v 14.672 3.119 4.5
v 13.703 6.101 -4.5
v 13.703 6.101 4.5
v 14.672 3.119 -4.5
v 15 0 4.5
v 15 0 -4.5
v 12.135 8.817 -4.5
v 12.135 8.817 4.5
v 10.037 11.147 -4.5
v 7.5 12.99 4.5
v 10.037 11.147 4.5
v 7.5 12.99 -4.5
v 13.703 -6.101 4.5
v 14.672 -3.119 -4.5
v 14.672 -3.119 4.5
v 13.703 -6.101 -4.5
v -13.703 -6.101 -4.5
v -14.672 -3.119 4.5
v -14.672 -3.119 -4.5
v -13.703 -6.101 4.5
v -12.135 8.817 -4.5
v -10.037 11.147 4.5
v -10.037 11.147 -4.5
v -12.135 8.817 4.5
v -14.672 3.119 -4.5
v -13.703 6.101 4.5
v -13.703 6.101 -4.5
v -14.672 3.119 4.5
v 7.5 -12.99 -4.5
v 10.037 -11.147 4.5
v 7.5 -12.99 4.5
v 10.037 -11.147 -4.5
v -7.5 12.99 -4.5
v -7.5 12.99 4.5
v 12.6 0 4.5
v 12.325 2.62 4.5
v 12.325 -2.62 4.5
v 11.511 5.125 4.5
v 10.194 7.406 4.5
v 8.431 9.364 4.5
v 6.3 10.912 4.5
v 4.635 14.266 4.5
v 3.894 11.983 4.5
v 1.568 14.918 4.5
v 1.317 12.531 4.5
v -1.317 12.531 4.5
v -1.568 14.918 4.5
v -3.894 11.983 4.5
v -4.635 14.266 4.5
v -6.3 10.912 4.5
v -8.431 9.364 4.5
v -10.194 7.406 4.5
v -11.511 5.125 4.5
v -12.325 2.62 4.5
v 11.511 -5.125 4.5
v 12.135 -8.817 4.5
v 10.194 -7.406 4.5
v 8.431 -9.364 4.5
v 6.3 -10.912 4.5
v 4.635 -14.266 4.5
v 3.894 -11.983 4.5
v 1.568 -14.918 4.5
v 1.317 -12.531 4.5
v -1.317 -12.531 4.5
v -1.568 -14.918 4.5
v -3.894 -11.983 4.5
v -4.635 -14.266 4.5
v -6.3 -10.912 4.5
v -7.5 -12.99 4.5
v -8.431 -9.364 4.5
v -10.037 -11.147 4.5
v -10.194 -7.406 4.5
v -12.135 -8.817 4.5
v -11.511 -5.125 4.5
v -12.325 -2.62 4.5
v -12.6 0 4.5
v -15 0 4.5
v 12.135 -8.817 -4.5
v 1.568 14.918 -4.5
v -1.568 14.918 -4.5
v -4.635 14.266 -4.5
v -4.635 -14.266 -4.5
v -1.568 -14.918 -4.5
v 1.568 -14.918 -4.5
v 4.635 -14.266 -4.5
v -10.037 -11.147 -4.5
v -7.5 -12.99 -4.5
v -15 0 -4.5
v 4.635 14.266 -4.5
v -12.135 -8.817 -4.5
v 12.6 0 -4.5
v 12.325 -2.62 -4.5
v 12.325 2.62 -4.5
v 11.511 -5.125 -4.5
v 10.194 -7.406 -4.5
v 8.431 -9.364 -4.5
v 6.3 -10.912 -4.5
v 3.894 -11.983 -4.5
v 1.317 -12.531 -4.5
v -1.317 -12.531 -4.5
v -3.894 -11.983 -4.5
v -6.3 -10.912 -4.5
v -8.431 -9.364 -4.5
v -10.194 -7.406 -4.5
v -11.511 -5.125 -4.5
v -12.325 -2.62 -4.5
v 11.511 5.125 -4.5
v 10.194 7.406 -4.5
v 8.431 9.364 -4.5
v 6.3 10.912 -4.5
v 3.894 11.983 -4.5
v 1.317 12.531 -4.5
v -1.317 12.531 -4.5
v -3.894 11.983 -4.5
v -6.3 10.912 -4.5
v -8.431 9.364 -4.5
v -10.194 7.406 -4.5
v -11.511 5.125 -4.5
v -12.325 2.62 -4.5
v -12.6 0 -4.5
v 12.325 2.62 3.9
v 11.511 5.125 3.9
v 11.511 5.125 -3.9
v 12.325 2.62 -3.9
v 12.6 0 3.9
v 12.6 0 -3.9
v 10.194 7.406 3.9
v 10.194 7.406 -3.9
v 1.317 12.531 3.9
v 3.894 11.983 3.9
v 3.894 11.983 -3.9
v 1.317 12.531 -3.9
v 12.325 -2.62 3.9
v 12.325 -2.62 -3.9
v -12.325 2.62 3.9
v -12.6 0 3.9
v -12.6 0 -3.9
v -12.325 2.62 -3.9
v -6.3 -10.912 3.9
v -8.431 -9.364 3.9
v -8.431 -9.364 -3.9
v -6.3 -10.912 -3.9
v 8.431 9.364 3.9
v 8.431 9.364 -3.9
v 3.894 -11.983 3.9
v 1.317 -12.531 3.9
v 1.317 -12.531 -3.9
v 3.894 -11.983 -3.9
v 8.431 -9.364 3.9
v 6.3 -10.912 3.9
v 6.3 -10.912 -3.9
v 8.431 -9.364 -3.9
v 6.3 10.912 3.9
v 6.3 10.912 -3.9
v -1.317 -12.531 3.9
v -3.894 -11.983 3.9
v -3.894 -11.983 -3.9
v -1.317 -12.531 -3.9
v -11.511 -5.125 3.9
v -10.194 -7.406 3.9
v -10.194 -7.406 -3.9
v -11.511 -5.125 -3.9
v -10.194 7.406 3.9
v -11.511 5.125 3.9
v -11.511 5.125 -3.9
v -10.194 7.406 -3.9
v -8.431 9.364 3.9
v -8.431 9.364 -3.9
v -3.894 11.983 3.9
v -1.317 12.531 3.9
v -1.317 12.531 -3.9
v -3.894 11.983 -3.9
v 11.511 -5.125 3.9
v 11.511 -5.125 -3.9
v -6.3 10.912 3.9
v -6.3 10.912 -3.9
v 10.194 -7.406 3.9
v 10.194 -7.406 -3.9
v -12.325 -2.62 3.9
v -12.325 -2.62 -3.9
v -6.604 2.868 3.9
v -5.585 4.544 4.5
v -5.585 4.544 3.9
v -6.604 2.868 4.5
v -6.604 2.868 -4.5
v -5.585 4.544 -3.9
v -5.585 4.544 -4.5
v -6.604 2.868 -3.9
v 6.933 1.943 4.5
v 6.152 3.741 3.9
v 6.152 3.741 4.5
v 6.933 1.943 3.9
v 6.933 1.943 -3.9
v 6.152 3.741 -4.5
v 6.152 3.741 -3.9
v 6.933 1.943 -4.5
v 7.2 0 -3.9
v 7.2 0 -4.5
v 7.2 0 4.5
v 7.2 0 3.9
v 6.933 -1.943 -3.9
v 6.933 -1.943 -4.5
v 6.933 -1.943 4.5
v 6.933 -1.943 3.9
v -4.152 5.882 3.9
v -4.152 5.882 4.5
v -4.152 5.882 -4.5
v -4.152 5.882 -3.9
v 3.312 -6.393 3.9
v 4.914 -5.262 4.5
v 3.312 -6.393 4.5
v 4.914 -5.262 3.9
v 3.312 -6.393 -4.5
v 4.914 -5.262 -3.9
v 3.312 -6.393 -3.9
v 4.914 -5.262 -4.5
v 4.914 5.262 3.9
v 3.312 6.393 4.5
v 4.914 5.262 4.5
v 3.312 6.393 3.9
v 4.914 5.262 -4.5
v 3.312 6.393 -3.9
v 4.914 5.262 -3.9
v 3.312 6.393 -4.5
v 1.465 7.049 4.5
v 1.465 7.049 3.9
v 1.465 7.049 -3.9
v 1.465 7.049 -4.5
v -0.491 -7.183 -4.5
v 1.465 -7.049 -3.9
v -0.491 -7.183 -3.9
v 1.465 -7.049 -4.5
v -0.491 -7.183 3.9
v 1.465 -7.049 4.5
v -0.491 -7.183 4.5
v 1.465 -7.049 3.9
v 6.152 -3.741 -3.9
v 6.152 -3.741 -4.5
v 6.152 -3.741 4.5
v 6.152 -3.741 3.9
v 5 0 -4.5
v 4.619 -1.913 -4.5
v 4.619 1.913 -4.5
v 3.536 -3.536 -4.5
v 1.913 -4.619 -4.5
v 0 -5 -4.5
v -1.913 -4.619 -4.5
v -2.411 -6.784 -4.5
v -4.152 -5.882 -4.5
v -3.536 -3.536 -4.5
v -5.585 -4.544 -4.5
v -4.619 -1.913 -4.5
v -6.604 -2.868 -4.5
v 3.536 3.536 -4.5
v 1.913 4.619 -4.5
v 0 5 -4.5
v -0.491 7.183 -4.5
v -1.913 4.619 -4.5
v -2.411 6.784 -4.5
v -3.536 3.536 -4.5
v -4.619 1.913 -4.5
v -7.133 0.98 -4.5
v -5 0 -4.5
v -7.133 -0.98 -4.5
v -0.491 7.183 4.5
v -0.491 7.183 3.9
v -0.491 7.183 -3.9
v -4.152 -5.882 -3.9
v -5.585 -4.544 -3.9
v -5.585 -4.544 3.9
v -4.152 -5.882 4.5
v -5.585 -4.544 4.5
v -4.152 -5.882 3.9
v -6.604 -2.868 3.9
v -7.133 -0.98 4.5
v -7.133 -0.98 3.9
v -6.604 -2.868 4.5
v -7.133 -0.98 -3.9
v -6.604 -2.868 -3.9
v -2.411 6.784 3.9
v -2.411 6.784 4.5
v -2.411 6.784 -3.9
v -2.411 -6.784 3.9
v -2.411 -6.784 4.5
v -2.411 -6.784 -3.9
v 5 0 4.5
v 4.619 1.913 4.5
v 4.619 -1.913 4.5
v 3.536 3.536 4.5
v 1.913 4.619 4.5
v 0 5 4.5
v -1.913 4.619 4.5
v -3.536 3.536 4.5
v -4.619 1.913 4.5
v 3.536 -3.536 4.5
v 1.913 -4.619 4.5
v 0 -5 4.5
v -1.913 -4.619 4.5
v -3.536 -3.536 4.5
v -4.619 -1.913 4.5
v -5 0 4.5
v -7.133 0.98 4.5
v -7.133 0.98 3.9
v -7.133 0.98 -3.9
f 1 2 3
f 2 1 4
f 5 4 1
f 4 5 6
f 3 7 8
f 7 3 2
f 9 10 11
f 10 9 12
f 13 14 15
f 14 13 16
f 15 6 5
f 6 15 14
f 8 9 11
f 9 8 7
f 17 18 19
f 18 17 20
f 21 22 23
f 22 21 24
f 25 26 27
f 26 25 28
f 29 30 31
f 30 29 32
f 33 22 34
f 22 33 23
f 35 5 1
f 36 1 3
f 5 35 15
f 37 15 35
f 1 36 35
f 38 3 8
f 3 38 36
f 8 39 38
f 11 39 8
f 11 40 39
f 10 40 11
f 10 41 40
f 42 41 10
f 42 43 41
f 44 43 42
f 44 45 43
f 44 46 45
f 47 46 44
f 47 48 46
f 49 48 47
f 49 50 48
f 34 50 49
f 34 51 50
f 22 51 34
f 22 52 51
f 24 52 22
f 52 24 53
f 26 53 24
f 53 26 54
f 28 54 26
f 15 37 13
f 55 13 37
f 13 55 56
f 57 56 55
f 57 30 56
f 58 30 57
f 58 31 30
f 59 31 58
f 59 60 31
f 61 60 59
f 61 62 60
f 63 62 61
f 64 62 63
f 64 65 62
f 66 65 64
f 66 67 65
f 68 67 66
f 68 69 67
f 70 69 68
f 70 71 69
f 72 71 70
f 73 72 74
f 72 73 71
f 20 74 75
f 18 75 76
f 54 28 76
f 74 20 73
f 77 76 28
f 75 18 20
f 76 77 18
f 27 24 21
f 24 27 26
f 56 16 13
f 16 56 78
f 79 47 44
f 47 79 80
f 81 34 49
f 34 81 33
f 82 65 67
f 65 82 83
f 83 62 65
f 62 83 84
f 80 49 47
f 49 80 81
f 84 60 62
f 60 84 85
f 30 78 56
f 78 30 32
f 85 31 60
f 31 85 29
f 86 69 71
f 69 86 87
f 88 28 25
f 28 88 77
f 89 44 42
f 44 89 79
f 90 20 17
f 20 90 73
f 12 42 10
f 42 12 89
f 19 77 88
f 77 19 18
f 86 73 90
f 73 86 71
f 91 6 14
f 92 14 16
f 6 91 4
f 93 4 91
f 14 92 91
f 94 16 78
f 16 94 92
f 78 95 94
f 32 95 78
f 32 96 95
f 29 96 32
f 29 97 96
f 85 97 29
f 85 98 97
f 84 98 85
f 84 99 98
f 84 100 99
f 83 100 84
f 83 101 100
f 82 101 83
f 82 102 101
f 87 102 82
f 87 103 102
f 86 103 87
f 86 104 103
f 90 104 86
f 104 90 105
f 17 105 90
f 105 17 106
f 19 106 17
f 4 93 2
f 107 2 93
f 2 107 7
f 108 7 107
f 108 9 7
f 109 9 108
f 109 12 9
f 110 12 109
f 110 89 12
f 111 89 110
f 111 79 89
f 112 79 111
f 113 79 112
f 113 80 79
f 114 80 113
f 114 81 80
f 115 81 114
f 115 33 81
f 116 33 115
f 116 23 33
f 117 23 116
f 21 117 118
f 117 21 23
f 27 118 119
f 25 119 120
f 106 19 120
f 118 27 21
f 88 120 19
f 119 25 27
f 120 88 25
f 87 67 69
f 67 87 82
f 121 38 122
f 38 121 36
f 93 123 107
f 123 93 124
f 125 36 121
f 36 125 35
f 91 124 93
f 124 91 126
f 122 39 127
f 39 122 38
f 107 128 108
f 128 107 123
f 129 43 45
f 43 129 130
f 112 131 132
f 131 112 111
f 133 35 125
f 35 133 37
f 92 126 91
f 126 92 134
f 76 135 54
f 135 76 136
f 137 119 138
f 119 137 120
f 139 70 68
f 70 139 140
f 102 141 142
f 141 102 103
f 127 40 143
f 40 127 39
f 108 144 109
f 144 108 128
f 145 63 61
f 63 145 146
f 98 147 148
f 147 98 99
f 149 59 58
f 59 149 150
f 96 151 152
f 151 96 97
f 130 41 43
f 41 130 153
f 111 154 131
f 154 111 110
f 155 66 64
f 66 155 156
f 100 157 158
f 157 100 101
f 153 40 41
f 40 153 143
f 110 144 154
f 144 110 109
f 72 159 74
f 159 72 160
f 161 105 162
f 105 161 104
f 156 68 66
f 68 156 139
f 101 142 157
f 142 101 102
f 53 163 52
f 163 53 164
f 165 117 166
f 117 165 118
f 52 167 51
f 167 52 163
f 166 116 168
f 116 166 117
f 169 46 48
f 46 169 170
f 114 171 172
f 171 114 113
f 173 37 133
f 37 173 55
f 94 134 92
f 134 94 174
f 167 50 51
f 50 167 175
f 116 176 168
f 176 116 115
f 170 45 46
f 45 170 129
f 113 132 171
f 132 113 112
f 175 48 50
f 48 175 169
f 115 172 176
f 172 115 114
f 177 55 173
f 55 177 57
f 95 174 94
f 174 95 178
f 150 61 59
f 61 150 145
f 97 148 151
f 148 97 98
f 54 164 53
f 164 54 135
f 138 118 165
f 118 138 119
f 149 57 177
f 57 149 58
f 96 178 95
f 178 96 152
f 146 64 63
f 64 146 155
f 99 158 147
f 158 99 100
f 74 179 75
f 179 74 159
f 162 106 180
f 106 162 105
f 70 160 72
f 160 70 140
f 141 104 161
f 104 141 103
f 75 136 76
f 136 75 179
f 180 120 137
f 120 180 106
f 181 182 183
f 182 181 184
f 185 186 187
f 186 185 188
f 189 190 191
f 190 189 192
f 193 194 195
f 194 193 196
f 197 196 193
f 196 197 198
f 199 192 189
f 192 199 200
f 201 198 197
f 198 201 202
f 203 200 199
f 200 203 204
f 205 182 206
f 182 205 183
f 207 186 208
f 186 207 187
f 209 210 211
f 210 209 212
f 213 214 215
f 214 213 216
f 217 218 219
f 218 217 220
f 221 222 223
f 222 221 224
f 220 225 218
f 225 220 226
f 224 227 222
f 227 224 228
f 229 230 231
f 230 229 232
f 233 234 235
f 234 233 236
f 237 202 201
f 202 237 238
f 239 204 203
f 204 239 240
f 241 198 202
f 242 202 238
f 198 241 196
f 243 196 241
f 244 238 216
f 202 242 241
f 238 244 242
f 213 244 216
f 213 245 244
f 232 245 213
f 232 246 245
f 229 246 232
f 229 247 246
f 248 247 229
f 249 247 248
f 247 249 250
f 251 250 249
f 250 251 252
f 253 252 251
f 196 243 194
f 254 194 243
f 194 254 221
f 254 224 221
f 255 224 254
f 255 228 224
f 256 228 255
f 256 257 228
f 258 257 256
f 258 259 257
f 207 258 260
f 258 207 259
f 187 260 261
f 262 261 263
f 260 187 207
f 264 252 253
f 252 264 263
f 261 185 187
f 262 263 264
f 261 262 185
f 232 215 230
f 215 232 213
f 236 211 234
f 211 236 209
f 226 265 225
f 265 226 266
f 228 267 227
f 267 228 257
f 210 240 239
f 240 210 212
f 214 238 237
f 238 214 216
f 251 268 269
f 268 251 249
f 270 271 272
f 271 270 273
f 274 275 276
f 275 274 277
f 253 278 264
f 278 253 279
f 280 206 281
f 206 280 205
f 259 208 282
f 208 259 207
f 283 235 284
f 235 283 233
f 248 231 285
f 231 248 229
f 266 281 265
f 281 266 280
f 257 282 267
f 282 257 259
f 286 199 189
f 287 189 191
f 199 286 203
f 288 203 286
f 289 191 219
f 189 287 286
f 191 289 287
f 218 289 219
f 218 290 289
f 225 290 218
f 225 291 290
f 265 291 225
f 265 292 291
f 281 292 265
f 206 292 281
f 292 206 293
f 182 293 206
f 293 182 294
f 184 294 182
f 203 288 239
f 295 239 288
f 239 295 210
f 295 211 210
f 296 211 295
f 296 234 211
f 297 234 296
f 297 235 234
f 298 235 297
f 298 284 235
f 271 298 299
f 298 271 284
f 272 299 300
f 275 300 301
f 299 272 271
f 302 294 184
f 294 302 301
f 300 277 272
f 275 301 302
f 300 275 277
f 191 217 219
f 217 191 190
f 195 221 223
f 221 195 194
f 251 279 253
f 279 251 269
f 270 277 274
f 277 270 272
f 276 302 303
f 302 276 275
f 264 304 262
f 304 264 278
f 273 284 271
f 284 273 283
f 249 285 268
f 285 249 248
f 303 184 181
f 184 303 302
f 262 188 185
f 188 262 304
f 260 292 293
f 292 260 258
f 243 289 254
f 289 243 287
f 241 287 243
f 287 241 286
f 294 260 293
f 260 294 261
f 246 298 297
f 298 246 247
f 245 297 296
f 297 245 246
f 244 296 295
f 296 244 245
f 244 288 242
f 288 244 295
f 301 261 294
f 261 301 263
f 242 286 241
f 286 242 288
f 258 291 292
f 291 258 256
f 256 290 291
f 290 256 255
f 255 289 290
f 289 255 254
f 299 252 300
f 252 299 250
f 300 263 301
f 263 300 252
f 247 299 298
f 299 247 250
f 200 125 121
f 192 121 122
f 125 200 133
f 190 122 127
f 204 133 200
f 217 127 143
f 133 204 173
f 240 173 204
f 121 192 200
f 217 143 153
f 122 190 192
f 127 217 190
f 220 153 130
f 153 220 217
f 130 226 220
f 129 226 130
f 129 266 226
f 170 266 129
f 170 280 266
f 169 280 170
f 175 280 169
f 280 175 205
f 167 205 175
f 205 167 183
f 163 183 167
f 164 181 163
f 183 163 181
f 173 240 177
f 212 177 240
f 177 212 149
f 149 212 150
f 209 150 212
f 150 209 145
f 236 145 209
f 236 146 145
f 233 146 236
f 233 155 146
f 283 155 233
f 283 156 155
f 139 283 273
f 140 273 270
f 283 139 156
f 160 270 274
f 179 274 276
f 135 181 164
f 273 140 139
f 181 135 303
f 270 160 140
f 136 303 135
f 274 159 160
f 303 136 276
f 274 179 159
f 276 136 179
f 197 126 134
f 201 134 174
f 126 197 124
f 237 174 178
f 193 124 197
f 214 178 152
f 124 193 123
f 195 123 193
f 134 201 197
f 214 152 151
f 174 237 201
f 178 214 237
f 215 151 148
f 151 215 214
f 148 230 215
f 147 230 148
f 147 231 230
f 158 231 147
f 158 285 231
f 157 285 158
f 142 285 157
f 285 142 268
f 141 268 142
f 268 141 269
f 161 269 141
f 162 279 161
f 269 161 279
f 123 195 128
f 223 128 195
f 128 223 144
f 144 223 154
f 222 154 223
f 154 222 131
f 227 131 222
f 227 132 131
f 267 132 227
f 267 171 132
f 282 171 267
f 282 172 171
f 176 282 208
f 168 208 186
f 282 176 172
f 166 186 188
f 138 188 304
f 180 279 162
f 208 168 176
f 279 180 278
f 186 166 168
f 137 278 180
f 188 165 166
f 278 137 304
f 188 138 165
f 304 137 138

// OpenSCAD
// Parameters
bore_diameter_mm = 10; //[5:20:0.1]
outer_diameter_mm = 30; //[15:60:0.1]
width_mm = 9; //[4.5:18:0.1]
bore_radius_mm = 5; //[2.5:10:0.1]
outer_radius_mm = 15; //[7.5:30:0.1]
eps_mm = 0.8; //[0.2:2:0.1]
outer_rim_radial_mm = 2.4; //[1.2:4.8:0.1]
inner_hub_radial_mm = 2.2; //[1.1:4.4:0.1]
shield_radial_thickness_mm = 1.2; //[0.6:2.4:0.1]
shield_axial_inset_mm = 0.6; //[0.2:1.5:0.1]
ball_diameter_mm = 4.5; //[2.5:7:0.1]

// Outer Ring
module outer_ring() {
  color("Silver") difference() {
    cylinder(r=outer_radius_mm, h=width_mm, center=true);
    cylinder(r=outer_radius_mm - outer_rim_radial_mm, h=width_mm + 2*eps_mm, center=true);
  }
}

// Inner Ring
module inner_ring() {
  color("DimGray") difference() {
    cylinder(r=bore_radius_mm + inner_hub_radial_mm, h=width_mm, center=true);
    cylinder(r=bore_radius_mm, h=width_mm + 2*eps_mm, center=true);
  }
}

// Shield or Seal Annulus
module shield_or_seal_annulus() {
  color("Black") difference() {
    cylinder(r=outer_radius_mm - outer_rim_radial_mm + eps_mm, h=width_mm - 2*shield_axial_inset_mm, center=true);
    cylinder(r=bore_radius_mm + inner_hub_radial_mm - eps_mm, h=width_mm - 2*shield_axial_inset_mm + 2*eps_mm, center=true);
  }
}

// Bearing Ball
module bearing_ball() {
  color("Copper") translate([
    bore_radius_mm + inner_hub_radial_mm + ((outer_radius_mm - outer_rim_radial_mm) - (bore_radius_mm + inner_hub_radial_mm))/2,
    0,
    0
  ]) sphere(r=ball_diameter_mm/2);
}

// Ball Bearing Assembly
module ball_bearing() {
  union() {
    outer_ring();
    inner_ring();
    shield_or_seal_annulus();
    bearing_ball();
  }
}

// Final Assembly
module assembly() {
  ball_bearing();
}

assembly();
